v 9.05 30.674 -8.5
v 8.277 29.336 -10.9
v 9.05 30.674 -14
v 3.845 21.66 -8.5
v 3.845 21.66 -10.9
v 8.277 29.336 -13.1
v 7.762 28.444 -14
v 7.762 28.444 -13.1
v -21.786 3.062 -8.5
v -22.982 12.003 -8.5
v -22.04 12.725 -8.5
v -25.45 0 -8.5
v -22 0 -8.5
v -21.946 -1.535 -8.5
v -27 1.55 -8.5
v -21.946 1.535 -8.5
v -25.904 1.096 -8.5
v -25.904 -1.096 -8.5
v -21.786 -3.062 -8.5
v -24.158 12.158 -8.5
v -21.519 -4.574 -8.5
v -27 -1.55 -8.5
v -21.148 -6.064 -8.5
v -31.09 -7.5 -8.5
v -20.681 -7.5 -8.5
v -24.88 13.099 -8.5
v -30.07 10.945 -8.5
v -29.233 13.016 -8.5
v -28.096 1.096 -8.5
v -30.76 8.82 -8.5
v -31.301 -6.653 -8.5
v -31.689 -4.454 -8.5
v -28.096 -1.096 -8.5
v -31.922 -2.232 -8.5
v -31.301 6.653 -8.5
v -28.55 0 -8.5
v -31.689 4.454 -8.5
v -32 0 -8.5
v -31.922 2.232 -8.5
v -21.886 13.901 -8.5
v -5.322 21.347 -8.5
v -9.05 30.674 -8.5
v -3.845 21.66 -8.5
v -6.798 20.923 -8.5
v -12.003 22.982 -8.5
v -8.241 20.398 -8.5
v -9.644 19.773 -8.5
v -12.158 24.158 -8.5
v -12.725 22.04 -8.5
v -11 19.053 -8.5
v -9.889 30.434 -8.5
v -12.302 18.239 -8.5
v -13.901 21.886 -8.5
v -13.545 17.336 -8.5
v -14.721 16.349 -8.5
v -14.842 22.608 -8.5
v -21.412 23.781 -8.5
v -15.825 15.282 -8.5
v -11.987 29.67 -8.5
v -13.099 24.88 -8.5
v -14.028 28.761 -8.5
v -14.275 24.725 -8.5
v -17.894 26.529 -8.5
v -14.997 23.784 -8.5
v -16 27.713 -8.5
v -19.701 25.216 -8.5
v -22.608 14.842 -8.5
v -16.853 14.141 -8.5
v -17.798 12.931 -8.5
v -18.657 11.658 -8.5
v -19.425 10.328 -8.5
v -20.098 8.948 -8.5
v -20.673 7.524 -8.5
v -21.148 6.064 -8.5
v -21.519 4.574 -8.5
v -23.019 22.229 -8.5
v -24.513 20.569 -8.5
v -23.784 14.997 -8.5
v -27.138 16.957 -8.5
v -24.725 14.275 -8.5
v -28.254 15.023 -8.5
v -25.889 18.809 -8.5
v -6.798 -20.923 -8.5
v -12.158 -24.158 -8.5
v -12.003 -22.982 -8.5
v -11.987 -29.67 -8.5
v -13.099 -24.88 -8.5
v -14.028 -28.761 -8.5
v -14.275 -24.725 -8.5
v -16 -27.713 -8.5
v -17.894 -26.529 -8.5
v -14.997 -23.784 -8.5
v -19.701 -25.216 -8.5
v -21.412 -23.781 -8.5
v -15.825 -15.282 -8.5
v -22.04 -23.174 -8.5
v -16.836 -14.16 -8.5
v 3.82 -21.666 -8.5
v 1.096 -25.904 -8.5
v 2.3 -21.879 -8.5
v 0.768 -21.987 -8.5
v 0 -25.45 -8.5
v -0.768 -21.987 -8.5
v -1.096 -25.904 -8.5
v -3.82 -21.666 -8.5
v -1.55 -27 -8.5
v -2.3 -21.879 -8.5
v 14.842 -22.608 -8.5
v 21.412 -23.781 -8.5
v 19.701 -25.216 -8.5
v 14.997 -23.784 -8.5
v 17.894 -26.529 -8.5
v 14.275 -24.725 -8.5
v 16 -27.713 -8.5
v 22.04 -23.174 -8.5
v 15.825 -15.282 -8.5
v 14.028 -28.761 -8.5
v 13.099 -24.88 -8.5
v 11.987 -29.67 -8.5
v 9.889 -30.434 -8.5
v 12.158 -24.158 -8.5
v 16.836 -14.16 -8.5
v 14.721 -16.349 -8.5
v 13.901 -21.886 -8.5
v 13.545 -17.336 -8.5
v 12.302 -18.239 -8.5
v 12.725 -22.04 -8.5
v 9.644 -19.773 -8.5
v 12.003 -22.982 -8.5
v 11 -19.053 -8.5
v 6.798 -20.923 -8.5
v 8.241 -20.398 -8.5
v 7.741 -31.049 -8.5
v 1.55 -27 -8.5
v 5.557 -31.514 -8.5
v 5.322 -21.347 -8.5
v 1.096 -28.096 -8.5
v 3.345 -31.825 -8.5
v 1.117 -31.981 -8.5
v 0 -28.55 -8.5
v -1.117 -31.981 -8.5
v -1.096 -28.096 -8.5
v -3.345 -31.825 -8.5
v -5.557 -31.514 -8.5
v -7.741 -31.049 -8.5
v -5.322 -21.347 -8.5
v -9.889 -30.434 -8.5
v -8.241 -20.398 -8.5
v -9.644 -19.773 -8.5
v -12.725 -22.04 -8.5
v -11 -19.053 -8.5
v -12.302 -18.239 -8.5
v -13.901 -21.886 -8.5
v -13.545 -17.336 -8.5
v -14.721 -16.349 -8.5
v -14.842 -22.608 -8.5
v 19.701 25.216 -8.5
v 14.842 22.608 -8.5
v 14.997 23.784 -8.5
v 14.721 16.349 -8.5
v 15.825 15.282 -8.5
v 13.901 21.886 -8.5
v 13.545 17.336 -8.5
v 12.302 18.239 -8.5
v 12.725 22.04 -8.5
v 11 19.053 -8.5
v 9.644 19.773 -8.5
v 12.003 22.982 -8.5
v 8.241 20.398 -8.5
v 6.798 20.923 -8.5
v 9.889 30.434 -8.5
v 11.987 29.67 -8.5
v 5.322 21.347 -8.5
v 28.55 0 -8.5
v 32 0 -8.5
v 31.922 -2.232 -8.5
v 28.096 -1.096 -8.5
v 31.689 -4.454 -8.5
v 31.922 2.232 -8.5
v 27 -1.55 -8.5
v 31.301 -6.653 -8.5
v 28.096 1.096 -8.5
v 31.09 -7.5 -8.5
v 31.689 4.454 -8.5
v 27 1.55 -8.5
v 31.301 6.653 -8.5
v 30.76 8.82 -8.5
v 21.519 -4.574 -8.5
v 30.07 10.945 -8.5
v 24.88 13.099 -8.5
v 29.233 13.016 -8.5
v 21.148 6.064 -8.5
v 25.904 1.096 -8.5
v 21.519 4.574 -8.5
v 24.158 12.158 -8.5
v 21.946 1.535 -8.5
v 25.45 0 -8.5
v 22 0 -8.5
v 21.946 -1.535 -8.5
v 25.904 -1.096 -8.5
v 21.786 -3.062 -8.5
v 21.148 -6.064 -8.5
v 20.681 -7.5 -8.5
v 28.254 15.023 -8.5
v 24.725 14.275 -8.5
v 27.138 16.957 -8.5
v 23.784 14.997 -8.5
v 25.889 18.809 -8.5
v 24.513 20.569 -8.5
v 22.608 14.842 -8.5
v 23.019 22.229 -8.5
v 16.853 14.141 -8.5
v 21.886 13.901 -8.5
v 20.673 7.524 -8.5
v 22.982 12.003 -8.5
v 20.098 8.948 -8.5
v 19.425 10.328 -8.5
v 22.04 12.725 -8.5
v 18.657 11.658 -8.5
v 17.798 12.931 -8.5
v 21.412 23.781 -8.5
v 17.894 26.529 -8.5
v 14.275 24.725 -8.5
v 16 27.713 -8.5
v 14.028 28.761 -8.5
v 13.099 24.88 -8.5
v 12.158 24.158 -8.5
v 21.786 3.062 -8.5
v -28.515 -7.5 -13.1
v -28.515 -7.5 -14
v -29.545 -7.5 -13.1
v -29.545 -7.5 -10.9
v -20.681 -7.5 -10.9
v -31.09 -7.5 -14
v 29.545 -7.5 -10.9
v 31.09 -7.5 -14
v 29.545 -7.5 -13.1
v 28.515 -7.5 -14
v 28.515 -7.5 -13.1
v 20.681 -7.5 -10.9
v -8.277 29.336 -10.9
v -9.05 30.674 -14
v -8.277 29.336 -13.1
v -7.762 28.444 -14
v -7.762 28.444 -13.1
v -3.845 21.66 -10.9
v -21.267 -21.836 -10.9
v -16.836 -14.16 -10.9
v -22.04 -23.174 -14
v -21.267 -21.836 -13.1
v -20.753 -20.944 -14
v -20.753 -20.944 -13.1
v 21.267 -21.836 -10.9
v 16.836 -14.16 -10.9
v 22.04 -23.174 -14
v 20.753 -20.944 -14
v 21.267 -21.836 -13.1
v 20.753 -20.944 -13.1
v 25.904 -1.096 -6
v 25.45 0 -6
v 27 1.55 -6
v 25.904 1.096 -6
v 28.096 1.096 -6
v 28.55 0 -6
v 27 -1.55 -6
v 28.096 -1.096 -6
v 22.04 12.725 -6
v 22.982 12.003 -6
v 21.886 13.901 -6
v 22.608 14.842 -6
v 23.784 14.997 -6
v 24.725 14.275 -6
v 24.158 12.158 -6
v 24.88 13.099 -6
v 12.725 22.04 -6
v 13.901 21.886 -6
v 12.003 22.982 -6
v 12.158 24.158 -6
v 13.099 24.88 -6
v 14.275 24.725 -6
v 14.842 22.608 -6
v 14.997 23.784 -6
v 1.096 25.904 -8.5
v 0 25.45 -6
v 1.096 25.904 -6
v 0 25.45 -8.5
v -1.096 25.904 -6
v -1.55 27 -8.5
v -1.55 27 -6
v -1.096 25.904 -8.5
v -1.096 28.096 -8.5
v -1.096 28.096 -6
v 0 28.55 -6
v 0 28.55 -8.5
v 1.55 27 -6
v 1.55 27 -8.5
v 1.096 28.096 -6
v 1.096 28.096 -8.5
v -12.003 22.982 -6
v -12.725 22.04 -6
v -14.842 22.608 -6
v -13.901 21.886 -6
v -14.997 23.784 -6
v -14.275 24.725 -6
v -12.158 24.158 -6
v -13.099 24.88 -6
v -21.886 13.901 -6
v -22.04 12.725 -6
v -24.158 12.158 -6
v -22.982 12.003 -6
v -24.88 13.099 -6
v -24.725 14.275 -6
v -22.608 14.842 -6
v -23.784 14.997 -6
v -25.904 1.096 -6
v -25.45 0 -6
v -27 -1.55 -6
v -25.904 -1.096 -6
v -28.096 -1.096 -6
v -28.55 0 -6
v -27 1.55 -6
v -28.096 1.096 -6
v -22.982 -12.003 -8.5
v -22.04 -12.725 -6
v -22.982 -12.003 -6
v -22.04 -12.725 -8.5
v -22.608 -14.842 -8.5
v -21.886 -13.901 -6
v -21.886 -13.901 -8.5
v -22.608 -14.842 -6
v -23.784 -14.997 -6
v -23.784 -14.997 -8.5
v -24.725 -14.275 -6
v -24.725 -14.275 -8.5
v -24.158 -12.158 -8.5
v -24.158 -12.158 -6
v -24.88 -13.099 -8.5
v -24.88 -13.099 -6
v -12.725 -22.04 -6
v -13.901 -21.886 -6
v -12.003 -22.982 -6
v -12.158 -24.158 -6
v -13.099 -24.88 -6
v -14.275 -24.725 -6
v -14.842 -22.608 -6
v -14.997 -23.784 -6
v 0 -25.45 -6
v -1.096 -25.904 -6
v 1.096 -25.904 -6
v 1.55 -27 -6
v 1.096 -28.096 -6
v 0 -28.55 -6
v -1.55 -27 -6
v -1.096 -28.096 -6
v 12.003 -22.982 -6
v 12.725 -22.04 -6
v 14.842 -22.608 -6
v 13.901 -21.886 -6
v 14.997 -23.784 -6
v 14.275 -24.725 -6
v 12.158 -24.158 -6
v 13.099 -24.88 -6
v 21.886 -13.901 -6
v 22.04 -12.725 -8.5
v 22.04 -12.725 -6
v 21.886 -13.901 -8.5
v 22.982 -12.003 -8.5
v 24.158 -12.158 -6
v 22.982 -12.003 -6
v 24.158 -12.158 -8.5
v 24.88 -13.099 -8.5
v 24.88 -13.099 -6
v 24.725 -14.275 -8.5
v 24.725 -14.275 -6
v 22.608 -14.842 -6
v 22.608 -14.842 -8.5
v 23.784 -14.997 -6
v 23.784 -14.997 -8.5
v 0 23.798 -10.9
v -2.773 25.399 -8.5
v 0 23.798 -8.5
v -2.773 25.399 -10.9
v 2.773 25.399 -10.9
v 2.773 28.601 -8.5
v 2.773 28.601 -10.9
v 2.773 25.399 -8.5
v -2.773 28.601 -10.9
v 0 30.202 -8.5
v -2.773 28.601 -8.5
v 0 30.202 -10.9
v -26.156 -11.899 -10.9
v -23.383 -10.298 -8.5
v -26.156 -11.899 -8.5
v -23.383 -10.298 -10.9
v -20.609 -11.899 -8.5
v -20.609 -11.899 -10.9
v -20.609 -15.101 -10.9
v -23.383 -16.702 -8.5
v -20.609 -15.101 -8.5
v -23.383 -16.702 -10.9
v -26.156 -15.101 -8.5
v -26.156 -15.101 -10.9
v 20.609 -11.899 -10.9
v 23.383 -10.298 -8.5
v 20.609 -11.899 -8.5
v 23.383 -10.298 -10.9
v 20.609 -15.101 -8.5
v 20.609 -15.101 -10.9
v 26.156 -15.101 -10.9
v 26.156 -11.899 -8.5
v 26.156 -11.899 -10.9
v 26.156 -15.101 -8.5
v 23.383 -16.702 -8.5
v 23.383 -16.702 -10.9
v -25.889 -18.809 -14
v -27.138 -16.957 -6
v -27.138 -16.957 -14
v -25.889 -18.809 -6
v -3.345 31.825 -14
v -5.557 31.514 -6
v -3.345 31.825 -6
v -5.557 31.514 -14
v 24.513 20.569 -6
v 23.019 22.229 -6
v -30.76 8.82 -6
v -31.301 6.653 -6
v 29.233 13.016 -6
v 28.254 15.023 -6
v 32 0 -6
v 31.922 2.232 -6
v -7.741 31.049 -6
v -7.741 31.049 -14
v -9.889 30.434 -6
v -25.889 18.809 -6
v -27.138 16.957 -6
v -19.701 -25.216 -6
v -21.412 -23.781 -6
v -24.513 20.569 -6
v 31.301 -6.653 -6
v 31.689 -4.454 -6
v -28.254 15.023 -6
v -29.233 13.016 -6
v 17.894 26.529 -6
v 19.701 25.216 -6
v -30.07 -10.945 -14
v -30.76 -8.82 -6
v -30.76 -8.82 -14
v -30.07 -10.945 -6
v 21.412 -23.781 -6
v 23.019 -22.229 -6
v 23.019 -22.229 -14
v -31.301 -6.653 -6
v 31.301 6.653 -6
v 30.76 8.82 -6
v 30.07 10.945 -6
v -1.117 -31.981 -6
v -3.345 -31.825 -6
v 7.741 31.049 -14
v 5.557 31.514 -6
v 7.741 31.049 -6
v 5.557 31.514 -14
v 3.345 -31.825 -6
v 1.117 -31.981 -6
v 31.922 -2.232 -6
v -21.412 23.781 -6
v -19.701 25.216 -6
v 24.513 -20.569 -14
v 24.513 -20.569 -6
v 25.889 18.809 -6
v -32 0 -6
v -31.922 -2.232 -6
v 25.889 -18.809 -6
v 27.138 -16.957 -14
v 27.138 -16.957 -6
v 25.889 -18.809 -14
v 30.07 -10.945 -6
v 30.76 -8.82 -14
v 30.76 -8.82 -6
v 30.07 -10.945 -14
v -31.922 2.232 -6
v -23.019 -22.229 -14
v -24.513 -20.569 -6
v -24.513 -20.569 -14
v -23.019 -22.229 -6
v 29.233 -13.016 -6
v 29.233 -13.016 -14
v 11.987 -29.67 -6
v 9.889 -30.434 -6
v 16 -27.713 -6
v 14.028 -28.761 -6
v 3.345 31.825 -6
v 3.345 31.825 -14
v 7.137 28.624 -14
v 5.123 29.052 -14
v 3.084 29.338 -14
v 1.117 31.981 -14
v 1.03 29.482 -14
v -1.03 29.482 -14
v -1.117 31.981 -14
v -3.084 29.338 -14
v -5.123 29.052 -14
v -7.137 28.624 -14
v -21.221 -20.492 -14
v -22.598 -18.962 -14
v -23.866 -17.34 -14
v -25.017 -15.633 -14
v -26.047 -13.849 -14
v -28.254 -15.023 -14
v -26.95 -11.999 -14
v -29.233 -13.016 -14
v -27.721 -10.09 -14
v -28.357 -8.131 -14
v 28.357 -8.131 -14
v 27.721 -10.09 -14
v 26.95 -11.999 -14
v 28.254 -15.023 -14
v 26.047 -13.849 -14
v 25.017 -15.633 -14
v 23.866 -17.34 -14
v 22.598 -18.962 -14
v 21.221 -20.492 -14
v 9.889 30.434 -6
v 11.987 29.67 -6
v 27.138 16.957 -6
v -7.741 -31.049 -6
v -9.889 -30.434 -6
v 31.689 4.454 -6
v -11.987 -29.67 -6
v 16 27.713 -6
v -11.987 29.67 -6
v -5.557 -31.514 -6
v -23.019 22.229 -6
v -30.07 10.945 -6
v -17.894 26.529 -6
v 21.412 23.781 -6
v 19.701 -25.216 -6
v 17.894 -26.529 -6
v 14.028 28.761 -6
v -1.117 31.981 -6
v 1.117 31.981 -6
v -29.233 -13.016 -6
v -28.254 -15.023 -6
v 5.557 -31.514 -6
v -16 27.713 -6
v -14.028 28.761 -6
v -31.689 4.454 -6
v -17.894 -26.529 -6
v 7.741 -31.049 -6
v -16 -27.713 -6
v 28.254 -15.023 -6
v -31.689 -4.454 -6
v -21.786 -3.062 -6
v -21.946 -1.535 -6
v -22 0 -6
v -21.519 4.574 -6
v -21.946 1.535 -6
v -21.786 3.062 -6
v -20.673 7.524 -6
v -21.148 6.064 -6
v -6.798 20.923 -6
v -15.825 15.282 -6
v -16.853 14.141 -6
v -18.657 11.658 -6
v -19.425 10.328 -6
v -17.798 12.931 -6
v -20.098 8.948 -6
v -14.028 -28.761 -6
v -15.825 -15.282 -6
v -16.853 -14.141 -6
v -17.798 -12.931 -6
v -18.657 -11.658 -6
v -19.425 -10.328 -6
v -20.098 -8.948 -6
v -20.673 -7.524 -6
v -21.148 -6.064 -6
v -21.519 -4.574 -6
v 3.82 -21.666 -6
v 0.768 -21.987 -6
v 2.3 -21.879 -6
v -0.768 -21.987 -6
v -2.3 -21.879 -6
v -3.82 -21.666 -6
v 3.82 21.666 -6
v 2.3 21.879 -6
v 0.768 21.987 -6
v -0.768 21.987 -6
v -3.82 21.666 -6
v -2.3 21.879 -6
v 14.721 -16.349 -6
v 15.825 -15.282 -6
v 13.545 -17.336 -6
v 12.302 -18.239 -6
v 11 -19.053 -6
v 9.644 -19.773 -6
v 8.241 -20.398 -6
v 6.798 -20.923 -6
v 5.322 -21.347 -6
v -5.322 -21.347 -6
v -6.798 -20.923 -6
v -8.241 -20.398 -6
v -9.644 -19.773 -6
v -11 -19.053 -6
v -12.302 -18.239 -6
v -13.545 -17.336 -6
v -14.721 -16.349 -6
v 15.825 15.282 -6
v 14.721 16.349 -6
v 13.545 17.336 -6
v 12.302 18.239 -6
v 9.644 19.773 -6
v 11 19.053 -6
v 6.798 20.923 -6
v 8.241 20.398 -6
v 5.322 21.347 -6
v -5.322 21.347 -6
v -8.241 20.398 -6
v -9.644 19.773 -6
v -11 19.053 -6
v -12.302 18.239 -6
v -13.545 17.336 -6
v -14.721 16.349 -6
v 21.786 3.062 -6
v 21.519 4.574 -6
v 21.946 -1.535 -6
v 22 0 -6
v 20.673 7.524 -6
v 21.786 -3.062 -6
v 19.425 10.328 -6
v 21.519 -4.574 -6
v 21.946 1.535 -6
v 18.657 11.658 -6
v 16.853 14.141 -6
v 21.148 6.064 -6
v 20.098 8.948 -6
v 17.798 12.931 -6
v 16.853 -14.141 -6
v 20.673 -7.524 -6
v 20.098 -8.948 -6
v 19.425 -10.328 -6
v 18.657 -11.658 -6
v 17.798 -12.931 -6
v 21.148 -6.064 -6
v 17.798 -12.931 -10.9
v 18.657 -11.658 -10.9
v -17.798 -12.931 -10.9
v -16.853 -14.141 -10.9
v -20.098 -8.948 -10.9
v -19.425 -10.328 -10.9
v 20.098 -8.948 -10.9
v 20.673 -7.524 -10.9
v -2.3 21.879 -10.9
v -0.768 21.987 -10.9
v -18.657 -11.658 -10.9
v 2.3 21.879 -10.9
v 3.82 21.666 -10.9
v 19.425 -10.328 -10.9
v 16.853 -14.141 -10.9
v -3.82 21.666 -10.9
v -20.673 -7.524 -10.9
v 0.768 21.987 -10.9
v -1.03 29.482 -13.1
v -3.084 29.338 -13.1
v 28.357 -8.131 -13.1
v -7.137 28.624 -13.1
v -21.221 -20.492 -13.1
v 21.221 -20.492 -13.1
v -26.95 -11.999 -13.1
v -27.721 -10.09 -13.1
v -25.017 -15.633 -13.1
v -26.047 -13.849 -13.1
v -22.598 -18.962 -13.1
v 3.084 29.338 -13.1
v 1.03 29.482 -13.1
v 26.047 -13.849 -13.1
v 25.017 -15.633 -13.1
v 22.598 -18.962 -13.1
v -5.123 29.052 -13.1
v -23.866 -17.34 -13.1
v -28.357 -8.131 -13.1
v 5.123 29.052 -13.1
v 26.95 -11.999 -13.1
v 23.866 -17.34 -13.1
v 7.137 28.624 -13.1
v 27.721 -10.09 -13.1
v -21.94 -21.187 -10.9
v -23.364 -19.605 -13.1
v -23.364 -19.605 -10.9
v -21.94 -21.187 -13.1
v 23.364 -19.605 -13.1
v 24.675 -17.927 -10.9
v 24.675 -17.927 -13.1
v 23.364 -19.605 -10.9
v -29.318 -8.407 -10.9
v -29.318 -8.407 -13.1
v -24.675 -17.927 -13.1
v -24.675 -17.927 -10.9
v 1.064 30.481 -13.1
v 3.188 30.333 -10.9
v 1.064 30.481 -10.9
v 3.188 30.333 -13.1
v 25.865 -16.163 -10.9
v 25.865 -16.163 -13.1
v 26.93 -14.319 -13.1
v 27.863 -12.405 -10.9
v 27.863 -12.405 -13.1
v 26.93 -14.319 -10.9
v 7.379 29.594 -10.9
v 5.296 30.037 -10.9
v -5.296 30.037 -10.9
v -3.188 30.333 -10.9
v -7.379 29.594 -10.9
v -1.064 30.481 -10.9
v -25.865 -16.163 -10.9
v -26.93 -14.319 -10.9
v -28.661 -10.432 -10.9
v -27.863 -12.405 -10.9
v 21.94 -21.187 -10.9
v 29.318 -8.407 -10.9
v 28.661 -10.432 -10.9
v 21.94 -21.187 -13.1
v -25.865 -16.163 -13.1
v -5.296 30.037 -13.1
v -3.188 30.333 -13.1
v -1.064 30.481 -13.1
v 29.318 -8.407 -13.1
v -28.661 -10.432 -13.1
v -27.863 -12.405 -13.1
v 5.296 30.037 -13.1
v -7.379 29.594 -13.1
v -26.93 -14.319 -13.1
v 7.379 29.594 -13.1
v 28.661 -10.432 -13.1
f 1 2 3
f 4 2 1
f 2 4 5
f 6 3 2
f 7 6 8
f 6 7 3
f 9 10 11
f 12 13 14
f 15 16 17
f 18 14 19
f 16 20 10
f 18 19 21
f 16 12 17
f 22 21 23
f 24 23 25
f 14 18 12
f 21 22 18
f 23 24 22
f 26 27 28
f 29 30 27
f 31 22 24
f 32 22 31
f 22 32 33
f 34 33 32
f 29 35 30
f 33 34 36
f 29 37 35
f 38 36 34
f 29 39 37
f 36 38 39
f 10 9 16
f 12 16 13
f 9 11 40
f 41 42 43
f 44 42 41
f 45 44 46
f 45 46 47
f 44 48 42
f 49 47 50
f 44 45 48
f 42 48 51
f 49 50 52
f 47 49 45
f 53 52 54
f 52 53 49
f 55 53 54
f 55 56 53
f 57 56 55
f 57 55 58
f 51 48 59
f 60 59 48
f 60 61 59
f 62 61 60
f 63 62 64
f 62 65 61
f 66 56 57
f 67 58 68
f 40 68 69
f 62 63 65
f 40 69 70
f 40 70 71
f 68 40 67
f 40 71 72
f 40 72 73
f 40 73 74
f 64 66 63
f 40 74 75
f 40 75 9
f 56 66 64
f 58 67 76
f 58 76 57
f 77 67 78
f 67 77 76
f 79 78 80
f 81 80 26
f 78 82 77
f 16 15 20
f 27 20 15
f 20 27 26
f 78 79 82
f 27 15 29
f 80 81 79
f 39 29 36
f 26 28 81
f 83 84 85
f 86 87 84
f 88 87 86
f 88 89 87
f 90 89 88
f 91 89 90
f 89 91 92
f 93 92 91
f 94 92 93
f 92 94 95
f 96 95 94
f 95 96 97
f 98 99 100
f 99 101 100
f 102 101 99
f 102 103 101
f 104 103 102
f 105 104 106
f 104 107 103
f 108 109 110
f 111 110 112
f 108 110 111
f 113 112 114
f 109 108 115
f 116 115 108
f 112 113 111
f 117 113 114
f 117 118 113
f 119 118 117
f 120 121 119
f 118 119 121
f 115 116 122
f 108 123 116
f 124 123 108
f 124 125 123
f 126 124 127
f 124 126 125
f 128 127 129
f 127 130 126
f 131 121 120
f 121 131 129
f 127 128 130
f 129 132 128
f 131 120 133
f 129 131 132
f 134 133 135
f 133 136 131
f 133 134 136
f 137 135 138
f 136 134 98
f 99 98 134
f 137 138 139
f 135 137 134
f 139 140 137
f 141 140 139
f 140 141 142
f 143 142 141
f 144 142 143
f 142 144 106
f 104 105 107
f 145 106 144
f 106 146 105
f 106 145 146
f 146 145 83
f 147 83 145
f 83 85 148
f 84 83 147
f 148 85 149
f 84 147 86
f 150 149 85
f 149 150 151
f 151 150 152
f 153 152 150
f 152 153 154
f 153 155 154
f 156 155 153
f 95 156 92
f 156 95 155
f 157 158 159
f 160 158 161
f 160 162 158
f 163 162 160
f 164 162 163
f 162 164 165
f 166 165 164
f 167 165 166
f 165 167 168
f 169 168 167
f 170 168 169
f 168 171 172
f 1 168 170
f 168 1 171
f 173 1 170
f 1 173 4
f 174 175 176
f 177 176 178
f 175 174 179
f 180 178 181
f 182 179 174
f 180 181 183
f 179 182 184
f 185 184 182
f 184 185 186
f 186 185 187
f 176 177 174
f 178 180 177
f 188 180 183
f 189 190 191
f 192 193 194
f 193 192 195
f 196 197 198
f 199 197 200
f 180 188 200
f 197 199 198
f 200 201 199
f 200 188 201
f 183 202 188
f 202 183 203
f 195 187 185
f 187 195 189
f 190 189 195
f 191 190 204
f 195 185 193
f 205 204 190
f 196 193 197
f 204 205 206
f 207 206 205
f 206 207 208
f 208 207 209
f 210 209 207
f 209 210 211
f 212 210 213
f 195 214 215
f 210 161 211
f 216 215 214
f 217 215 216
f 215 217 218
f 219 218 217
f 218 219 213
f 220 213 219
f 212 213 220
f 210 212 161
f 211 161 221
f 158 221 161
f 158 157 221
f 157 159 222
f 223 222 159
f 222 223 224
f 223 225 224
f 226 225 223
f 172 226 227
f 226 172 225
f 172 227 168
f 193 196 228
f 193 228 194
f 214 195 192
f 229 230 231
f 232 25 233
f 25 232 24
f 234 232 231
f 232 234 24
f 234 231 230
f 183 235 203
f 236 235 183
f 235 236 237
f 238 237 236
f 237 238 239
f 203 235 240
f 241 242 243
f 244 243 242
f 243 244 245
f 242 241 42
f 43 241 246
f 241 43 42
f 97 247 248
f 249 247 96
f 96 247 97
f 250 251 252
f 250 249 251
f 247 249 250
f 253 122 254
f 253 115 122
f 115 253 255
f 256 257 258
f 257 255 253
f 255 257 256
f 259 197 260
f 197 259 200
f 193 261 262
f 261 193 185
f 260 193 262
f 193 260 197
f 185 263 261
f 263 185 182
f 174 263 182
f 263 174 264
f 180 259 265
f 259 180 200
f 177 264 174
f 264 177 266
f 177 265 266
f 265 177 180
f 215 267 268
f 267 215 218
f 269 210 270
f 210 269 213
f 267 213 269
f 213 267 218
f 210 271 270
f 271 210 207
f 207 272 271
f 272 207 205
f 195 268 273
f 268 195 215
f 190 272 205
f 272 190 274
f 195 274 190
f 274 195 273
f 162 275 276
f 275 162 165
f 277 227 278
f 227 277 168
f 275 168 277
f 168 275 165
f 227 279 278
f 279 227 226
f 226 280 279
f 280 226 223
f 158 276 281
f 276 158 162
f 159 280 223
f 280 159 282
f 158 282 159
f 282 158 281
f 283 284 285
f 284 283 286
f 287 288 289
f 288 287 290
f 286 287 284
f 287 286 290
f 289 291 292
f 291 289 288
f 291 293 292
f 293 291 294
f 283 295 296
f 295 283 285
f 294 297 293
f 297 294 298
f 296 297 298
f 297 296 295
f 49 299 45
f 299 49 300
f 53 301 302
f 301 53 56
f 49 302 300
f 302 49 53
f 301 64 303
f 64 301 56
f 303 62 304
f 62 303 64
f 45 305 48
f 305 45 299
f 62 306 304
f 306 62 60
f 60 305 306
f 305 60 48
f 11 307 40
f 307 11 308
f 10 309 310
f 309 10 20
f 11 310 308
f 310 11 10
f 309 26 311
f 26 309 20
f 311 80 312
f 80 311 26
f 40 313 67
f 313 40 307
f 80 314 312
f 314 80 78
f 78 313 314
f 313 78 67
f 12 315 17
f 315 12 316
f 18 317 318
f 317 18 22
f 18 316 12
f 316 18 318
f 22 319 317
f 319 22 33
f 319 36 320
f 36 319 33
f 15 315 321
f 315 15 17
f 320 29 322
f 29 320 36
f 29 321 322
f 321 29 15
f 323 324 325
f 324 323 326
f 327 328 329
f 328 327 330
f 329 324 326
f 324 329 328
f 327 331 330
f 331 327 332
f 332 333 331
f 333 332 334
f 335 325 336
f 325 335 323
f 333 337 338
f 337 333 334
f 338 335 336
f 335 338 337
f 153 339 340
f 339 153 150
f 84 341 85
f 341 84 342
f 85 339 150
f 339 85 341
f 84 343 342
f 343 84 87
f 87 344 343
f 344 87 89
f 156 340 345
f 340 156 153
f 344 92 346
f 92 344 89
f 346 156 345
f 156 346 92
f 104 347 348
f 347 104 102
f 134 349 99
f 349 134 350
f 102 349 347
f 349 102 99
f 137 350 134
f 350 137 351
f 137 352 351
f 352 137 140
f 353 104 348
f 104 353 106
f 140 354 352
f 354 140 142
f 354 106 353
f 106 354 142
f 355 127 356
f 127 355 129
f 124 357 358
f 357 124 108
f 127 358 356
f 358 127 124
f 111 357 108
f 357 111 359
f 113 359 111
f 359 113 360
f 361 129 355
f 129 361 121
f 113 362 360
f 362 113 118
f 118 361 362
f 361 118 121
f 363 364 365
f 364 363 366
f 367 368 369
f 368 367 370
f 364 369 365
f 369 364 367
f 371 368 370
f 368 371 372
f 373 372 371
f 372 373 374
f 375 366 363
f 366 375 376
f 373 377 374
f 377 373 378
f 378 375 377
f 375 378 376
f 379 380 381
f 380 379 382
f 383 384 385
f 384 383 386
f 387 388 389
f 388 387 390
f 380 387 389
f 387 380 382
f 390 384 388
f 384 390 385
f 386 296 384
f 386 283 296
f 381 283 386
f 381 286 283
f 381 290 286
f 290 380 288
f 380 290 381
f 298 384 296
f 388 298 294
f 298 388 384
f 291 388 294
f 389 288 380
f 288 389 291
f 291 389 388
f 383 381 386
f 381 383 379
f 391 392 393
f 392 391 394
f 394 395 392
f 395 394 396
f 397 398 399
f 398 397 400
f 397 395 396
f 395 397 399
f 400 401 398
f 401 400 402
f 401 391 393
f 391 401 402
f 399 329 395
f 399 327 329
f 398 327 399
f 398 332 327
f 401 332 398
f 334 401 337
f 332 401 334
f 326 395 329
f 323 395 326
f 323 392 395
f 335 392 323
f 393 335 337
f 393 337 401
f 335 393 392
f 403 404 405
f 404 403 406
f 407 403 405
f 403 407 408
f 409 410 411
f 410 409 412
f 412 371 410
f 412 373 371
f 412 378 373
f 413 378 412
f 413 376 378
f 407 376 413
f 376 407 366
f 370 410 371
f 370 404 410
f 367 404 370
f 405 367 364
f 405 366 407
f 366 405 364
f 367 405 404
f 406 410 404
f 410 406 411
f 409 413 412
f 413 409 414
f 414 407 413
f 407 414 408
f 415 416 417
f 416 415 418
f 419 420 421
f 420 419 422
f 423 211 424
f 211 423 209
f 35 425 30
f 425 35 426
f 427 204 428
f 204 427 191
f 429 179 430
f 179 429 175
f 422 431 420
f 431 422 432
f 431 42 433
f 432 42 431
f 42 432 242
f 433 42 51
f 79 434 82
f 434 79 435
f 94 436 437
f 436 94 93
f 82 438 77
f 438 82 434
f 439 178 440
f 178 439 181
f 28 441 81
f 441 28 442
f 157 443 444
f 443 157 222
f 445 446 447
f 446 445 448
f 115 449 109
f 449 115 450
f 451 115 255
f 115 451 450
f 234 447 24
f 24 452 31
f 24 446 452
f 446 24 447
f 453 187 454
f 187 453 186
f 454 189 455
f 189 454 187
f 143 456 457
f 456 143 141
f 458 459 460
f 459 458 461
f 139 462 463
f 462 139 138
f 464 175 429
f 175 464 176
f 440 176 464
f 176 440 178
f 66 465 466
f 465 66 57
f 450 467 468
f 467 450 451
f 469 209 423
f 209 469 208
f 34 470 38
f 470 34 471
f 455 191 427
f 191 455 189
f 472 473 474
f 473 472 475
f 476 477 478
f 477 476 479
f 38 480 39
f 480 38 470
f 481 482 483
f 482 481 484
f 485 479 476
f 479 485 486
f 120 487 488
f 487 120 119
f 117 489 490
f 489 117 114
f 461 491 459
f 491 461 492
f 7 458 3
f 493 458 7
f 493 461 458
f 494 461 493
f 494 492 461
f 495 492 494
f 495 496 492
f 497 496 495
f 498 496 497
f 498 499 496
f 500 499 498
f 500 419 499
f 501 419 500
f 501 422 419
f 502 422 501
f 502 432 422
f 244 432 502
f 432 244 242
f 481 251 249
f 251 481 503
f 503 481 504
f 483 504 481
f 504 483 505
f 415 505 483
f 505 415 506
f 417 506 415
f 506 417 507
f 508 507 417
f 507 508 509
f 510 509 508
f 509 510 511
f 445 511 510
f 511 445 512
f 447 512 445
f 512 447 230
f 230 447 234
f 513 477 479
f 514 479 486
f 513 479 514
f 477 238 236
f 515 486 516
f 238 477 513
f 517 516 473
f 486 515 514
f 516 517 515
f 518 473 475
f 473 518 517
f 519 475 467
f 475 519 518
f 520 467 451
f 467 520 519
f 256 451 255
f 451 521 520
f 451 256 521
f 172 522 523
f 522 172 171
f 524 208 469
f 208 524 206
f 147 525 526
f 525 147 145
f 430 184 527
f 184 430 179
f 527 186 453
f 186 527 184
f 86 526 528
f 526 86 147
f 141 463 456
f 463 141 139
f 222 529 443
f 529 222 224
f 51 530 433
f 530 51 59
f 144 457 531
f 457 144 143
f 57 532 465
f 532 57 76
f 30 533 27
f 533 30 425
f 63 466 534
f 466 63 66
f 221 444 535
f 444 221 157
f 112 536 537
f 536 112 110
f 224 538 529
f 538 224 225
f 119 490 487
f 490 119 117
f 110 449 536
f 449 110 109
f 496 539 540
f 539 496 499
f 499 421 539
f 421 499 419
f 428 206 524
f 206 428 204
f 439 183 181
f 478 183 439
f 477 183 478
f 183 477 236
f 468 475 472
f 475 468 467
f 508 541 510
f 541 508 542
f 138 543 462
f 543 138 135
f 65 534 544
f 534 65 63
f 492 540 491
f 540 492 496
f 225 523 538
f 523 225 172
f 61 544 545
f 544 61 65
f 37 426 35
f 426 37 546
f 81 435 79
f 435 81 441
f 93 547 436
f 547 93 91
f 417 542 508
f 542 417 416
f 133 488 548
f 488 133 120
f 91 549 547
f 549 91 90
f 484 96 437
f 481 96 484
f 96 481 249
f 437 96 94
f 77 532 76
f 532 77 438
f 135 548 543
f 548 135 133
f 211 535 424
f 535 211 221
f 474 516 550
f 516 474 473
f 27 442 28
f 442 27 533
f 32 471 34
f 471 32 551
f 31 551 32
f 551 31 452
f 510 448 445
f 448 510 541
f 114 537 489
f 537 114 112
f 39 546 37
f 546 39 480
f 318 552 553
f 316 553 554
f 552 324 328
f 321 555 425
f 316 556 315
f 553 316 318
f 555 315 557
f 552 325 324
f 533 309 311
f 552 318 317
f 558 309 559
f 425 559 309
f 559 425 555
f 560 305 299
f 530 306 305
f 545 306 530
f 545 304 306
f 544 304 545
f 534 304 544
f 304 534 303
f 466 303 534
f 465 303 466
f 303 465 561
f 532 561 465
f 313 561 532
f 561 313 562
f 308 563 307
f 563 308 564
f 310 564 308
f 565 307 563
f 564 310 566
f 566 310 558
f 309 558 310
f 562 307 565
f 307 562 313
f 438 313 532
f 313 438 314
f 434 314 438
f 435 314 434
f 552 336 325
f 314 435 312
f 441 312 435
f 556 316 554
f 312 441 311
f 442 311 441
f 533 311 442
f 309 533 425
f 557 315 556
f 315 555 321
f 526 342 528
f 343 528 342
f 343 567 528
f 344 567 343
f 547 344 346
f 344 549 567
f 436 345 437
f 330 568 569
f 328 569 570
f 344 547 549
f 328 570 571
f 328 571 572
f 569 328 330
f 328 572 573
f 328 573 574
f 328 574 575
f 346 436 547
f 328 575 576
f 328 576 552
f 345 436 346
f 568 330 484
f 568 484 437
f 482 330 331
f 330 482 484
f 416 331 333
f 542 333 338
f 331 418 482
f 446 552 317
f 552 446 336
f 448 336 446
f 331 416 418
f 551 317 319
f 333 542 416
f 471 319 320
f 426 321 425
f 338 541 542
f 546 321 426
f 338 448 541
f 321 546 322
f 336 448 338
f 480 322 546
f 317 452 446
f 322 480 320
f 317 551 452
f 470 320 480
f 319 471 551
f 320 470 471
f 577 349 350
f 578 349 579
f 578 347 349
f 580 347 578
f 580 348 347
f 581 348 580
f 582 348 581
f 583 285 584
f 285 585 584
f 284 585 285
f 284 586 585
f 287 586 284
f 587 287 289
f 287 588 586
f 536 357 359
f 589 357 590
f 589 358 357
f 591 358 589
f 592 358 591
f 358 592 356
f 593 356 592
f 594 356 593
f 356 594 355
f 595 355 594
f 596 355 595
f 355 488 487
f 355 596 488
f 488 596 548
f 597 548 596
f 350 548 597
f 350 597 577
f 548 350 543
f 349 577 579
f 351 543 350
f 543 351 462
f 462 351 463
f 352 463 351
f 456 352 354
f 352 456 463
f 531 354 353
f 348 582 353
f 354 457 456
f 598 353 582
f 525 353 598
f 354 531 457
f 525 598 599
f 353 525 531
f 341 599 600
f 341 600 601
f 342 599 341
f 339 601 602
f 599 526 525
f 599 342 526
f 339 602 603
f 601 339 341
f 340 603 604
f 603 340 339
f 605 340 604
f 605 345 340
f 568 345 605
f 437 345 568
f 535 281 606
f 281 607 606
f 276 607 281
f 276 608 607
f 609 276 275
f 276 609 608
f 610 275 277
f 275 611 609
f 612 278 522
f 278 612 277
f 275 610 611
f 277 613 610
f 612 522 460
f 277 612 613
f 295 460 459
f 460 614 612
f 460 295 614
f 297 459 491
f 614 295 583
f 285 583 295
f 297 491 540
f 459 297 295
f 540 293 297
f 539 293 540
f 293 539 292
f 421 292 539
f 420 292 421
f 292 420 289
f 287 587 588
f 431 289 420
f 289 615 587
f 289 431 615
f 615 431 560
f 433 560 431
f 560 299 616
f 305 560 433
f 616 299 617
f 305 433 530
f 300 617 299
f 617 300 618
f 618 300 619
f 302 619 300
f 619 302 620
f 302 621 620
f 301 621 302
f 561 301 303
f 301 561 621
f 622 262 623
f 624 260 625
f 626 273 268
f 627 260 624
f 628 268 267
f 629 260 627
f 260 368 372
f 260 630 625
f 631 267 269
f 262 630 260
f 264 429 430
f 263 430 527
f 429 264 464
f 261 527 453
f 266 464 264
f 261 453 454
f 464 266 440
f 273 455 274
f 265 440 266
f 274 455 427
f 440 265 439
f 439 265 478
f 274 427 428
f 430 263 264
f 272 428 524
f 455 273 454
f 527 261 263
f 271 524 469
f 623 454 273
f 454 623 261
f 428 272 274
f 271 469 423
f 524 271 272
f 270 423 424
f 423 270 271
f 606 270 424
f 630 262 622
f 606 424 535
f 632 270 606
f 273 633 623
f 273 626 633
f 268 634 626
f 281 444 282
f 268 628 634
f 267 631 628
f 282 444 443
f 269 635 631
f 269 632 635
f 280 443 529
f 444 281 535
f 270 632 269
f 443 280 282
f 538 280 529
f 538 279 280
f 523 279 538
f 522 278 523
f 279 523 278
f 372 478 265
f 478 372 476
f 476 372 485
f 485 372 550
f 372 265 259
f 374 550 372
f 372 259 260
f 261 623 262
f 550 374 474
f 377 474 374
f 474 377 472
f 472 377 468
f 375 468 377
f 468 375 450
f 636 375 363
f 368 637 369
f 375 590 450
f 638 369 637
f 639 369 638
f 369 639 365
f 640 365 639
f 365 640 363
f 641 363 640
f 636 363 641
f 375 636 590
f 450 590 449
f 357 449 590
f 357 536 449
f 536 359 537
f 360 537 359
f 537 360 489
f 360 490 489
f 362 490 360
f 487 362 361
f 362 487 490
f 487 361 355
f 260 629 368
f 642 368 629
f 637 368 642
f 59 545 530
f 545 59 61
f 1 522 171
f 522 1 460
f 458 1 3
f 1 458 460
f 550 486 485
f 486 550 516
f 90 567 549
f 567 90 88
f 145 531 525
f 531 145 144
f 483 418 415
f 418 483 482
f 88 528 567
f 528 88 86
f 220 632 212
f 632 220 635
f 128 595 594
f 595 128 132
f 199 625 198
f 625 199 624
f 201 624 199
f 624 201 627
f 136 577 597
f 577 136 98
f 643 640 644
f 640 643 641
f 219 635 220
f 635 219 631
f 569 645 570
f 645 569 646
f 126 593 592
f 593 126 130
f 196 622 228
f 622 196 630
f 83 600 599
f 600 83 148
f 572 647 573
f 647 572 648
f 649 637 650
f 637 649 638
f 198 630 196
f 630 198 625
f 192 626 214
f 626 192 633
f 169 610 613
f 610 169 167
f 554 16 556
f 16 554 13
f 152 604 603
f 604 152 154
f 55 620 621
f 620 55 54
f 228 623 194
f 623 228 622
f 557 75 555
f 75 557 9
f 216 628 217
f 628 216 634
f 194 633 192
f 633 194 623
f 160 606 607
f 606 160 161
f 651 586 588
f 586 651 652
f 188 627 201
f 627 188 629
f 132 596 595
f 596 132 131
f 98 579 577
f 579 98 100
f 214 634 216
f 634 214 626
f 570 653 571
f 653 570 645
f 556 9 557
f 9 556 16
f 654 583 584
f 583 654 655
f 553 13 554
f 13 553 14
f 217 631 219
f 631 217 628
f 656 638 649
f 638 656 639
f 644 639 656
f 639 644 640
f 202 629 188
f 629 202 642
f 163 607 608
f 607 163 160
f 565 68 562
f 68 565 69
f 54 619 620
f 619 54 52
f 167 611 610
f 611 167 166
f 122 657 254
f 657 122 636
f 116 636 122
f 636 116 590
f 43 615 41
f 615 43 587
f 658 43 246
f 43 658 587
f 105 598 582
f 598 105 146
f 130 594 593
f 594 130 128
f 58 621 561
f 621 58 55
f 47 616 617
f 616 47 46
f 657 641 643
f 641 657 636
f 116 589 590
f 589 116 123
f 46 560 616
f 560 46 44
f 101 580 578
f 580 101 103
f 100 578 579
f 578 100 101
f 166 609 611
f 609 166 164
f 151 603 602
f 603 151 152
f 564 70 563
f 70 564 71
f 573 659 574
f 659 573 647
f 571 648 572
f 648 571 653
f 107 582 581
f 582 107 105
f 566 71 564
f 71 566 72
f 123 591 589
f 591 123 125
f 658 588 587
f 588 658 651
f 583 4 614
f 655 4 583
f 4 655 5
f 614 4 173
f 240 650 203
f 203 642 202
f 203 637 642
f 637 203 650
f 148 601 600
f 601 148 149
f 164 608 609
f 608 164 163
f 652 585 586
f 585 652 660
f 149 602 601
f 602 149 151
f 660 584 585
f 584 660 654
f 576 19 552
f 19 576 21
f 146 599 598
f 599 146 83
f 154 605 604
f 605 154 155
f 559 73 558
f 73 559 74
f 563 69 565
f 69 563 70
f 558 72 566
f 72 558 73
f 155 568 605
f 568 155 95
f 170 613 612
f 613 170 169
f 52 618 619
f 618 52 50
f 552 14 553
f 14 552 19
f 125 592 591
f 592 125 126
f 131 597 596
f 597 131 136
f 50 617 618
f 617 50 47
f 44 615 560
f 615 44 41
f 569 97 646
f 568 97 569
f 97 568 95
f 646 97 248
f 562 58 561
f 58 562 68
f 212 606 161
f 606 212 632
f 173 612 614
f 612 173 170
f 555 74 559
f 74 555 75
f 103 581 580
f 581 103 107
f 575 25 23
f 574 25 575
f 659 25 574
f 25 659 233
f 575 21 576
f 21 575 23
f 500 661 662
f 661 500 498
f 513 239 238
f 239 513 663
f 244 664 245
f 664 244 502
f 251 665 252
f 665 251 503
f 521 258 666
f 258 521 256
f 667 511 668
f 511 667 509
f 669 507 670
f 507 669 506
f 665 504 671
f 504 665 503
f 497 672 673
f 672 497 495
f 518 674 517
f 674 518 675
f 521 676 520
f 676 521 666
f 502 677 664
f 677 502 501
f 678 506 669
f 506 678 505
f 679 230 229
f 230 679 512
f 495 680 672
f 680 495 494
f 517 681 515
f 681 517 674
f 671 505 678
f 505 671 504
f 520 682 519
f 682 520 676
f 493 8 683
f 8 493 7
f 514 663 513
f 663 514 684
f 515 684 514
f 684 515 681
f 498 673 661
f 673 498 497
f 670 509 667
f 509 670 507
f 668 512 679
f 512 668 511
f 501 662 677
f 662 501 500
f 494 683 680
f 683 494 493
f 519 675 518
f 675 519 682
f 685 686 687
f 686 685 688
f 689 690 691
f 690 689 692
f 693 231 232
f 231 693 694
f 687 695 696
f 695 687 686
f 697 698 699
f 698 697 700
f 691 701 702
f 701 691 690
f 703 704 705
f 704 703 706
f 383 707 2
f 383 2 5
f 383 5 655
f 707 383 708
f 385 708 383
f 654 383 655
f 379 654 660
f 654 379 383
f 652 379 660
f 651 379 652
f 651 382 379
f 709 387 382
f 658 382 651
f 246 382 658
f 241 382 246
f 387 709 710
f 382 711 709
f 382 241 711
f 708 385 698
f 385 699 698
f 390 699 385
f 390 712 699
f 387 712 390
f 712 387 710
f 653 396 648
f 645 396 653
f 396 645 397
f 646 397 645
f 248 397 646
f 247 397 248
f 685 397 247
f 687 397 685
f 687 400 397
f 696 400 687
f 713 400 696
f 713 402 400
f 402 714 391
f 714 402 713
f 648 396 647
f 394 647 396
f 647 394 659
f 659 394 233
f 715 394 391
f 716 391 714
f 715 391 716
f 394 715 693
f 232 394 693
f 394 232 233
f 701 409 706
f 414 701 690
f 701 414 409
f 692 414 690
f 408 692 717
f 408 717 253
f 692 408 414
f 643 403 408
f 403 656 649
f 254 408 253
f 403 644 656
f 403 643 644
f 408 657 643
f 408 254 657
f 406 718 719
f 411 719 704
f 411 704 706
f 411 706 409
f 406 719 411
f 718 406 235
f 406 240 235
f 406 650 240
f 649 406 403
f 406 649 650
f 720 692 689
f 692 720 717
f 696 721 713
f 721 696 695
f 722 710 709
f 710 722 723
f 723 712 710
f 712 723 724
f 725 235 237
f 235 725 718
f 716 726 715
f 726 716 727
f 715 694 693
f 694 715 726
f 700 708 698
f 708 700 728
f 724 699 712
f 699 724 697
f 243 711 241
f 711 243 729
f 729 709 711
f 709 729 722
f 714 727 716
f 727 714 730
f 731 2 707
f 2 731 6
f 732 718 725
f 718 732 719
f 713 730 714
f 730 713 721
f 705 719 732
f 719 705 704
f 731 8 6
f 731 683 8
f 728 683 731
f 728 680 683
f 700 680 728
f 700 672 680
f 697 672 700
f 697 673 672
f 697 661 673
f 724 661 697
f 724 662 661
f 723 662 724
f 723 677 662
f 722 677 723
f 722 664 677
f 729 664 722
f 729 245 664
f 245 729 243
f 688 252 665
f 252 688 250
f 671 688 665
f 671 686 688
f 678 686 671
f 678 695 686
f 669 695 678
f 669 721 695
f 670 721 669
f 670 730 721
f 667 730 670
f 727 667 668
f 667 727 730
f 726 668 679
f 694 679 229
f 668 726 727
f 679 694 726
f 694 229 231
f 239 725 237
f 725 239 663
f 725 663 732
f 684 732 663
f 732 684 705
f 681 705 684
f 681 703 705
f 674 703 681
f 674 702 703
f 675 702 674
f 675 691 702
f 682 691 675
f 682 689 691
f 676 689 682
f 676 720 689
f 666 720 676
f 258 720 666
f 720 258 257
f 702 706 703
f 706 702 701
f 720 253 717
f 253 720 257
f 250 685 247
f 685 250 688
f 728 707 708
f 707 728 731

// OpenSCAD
// file: beam.scad
// Misumi Beam
module misumibeam(size1=15, size2=15, length=100, extra=0.1) {
   difference() {
      cube([size1+extra, size2+extra, length], center=true);
      for (a = [0:180:180]) rotate([0, 0, a]) {
         translate([size1/2, 0, 0]) {
          //  % cube([size1/2, 3, length+1], center=true);
			minkowski() {
               cube([size1/2-(extra+1), size1/6-extra, length+1], center=true);
               cylinder(r=0.5, h=1, center=true);
			} 
        }
      }
      for (a = [0:90:270]) rotate([0, 0, a]) {
         translate([size2/2, 0, 0]) {
          //  % cube([size1/2, 3, length+1], center=true);
			minkowski() {
               cube([size1/2-(extra+1), size1/6-extra, length+1], center=true);
               cylinder(r=0.5, h=1, center=true);
			} 
        }
      }
   }
}

# misumibeam(15, 15, 300);
// file: nema17.scad
include <configuration.scad>;

// NEMA17 stepper motor

module stepper_motor(length=47.5, shaft_radius=5.00/2) {
   intersection() {
      cube([42.2, length, 42.2], center=true);
      rotate([90, 0, 0])
      cylinder(r=25.5, h=length+1, center=true);
   }
   translate([0, -length/2, 0]) {
// drive shaft
		rotate([90, 0, 0]) {
		 cylinder(r1=11, r2=11, h=2, $fn=40);
		 cylinder(r=shaft_radius, h=25);
		}
// mounting bolts
      for (a = [0:90:360]) rotate([0, a, 0]) {
         translate([15.5, 0, 15.5]) rotate([90, 0, 0])
         cylinder(r=m3_major_radius, h=10,  $fn=30);
      }
   }
}

module stepper_motor_boolean(length=47.5, shaft_radius=7.00/2) {
   intersection() {
      cube([42.2, length, 42.2], center=true);
      rotate([90, 0, 0])
      cylinder(r=25.5, h=length+1, center=true);
   }
   translate([0, -length/2, 0]) {
// drive shaft
		rotate([90, 0, 0]) {
		 cylinder(r1=12+extra_boolean, r2=11+extra_boolean, h=2, $fn=40);
		 cylinder(r=shaft_radius, h=25, $fn=8);
		}
// mounting bolts
      for (a = [0:90:360]) rotate([0, a, 0]) {
         translate([15.5, 0, 15.5]) rotate([90, 0, 0])
         cylinder(r=m3_major_radius+extra_radius, h=10,  $fn=8);
      }
   }
}

//# stepper_motor();
# stepper_motor_boolean();
// file: metric_fastners.scad
/*
 *  OpenSCAD Metric Fastners Library (www.openscad.org)
 *  Copyright (C) 2010-2011  Giles Bathgate
 *
 *  This program is free software; you can redistribute it and/or modify
 *  it under the terms of the GNU General Public License as published by
 *  the Free Software Foundation; either version 3 of the License,
 *  LGPL version 2.1, or (at your option) any later version of the GPL.
 *
 *  This program is distributed in the hope that it will be useful,
 *  but WITHOUT ANY WARRANTY; without even the implied warranty of
 *  MERCHANTABILITY or FITNESS FOR A PARTICULAR PURPOSE.  See the
 *  GNU General Public License for more details.
 *
 *  You should have received a copy of the GNU General Public License
 *  along with this program; if not, write to the Free Software
 *  Foundation, Inc., 59 Temple Place, Suite 330, Boston, MA 02111-1307 USA
 *
*/

$fn=50;
apply_chamfer=false;

// M3 Mesurements
m3_minor_radius = 2.50/2;
m3_major_radius = 3.00/2;
m3_head_radius = 5.50/2;
m3_nut_radius = 6.20/2;

// M4 Mesurements
m4_minor_radius = 3.30/2;
m4_major_radius = 4.00/2;
m4_head_radius = 7.00/2;
m4_nut_radius = 8.26/2;

// M5 Mesurements
m5_minor_radius = 4.20/2;
m5_major_radius = 5.00/2;
m5_head_radius = 8.50/2;
m5_nut_radius = 10.33/2;

// M6 Mesurements
m6_minor_radius = 5.00/2;
m6_major_radius = 6.00/2;
m6_head_radius = 10.00/2;
m6_nut_radius = 12.40/2;


module cap_bolt(dia,len)
{
	e=1.5*dia;
	h1=1.25*dia;
	cylinder(r=dia/2,h=len);
	translate([0,0,-h1]) cylinder(r=e/2,h=h1);
}

module cap_bolt_boolean(dia,len,fn=8)
{
	e=1.87*dia;
	h1=2*dia;
	cylinder(r=dia/2,h=len,$fn=fn);
	translate([0,0,-h1+0.05]) cylinder(r2=e/2+0.15,r1=e/2+0.3,h=h1,$fn=fn);
}

module csk_bolt(dia,len)
{
	h1=0.6*dia;
	h2=len-h1;
	cylinder(r=dia/2,h=h2);
	cylinder(r1=dia,r2=dia/2,h=h1);
}

module washer(dia)
{
	t=0.1*dia;
	difference()
	{
		cylinder(r=dia,h=t);
		translate([0,0,-t/2])cylinder(r=dia/2,h=t*2);
	}
}

module flat_nut(dia)
{
	m=0.8*dia;
	e=2.066*dia;
	c=0.2*dia;
	difference()
	{
		cylinder(r=e/2,h=m,$fn=6);
		translate([0,0,-m/2])cylinder(r=dia/2,h=m*2);
		if(apply_chamfer)
		    translate([0,0,c])cylinder_chamfer(e/2,c);
	}
}

module flat_nut_boolean(dia)
{
	m=0.8*dia;
	e=2.066*dia;
	c=0.2*dia;
	difference()
	{
		cylinder(r=e/2,h=m,$fn=6);
		if(apply_chamfer)
		    translate([0,0,c])cylinder_chamfer(e/2,c);
	}
}

module bolt(dia,len)
{
	e=1.8*dia;
	k=0.7*dia;
	c=0.2*dia;
	difference()
	{
		cylinder(r=e/2,h=k,$fn=6);
		if(apply_chamfer)
		    translate([0,0,c])cylinder_chamfer(e/2,c);
	}

	cylinder(r=dia/2,h=len);

}

module cylinder_chamfer(r1,r2)
{
	t=r1-r2;
	p=r2*2;
	rotate_extrude()
	difference()
	{
		translate([t,-p])square([p,p]);
		translate([t,0])circle(r2);
	}
}

module chamfer(len,r)
{
	p=r*2;
	linear_extrude(height=len)
	difference()
	{
		square([p,p]);
		circle(r);
	}
}

union()
{
//cap_bolt(3,15);
//cap_bolt_boolean(3,15,30);
//csk_bolt(3,14);
//washer(3);
//flat_nut_boolean(3);
//bolt(4,14);
//cylinder_chamfer(8,1);
//chamfer(10,2);
}
// file: effector.scad
// Delta-Six 3D Printer 
// Created by Sage Merrill
// Released on Openbuilds.com
// Based on orginal design by Johann C. Rocholl (Kossel Printer)
// License = Attribution Share Alike - CC BY SA

include <configuration.scad>;
//use <light_ring_mount.scad>;

effector_offset = 37;  // Same as DELTA_EFFECTOR_OFFSET in Marlin.
effector_height = 11;
effector_arm_width = 15;
effector_arm_depth = 3;
effector_arm_bore = m3_bolt;

arm_separation = global_delta_arm_seperation-effector_arm_width;  // delta arm seperation
effector_bore_radius = global_effector_bore_radius;
mounting_hole_radius = global_mounting_hole_radius;


module effector() {
difference() {
// Main Body
	intersection() {	
		union() {
			minkowski() {
				cylinder(r=effector_offset-effector_arm_depth, h=1, center=true, $fn=6);
				sphere(effector_height/2, $fn=8);
			}
// Arms
			for (a = [60:120:360]) rotate([0, 0, a]) {
				for (s = [-1, 1]) scale([s, 1, 1]) {
					translate([arm_separation/2, effector_offset, 0]) rotate([90, 22.5, 90])
					 cylinder(r=effector_height/2+0.5, h=effector_arm_width, center=true, $fn=8);
					translate([arm_separation/2, effector_offset/2, 0])
					 cube([effector_arm_width, effector_offset, effector_height], center=true);
				}
			}
		}

// Plane down the height
	cube([300, 300, effector_height], center=true);	
	}

// Horizontal Arm Bore
#	for (a = [60:120:360]) rotate([0, 0, a]) {
		translate([0, effector_offset, 0]) rotate([0, 90, 0])
		 cylinder(r=effector_arm_bore/2, h=arm_separation+2*effector_arm_width, center=true, $fn=15);
	}

// Angled Arm Bores
*		for (a = [60:120:360]) rotate([0, 0, a]) {
			for (s = [-1, 1]) scale([s, 1, 1]) {
			translate([arm_separation/2, 22, -15]) rotate([-45, 0, 0])
			 cap_bolt(effector_arm_bore, 30);
			}		
		}

// Angled Nut channels
*		for (a = [60:120:360]) rotate([0, 0, a]) {
			for (a = [-1, 1]) scale([a, 1, 1]) {
			 translate([arm_separation/2, 36, -1]) rotate([-45, 0, 0])
				hull() {	
					for (h = [-1,1]) {
						translate([0, 10*h-9.5, 0]) rotate([0, 0, 30])
						 flat_nut_boolean(effector_arm_bore);
					}
				}
			}
		}

// Central Hole
	 cylinder(r=effector_bore_radius, h=effector_height*2, center=true, $fn=90);

// Hot End Mounting Holes
	for (a = [0:30:360]) rotate([0, 0, a]) {
		translate([0, mounting_hole_radius, 10]) rotate([0, 180, 0])
		 cap_bolt_boolean(m3_bolt_boolean, 20);
	 }

}

// Add the Light Ring Mount
	translate([0, 0, -effector_height/2-0.5]) rotate([0, 0, 0])	
	 light_mount();

}

// Primary placement
translate([0, 0, 0]) rotate([0, 0, 0])
 effector();


// reference/measure
*#	translate([0, 0, 0]) rotate([0, 0, 0])
	 cylinder(r=effector_offset, h=effector_height*2, center=true, $fn=30);

*#	translate([0, 0, 0]) rotate([0, 0, 0])
	 cube([arm_separation+effector_arm_width, effector_offset*2, effector_height*2], center=true);
// file: configuration.scad
// Delta-Six 3D Printer 
// Created by Sage Merrill
// Released on Openbuilds.com
// Based on orginal design by Johann C. Rocholl (Kossel Printer)
// License = Attribution Share Alike - CC BY SA


include <metric_fastners.scad>;
use <nema17.scad>;
use <beam.scad>;
use <timing_belts.scad>;

$fn=20;

// Increase this if your slicer or printer makes the holes too small.
extra_radius = 0.10;
extra_boolean = 0.15;

// Delta Parameters
global_delta_arm_seperation = 55;
global_effector_bore_radius = 21;
global_mounting_hole_radius = 27;

// M5 Hardware
m5_bolt = m5_major_radius*2;
m5_bolt_boolean = m5_bolt+extra_radius;

// M3 Hardware
m3_bolt = m3_major_radius*2;
m3_bolt_boolean = m3_bolt+extra_radius;

// NEMA17 stepper motor
motor_length = 47.5;
motor_shaft_radius= 5.00/2;
// main file
// Delta-Six 3D Printer 
// Created by Sage Merrill
// Released on Openbuilds.com
// Based on orginal design by Johann C. Rocholl (Kossel Printer)
// License = Attribution Share Alike - CC BY SA

include <configuration.scad>;
use <effector.scad>;

effector_height = 11;
effector_bore = global_effector_bore_radius+1;
mounting_hole_radius = global_mounting_hole_radius;

/*************************************************************************/

// Light Ring
module light_ring(){
difference () {
	translate([0, 0, 0]) rotate([0, 0, 0]) 
	 cylinder(r=60/2, h=1.8, center=true, $fn=90);
	translate([0, 0, 0]) rotate([0, 0, 0]) 
	 cylinder(r=44/2, h=10, center=true, $fn=90);		
	}
}


// Light Ring Mount
module light_mount(){
	difference () {
		union() {
			translate([0, 0, 0]) rotate([0, 0, 0]) 
			 cylinder(r=64/2, h=8, center=true, $fn=90);
		}

// Center Bore
	translate([0, 0, 0]) rotate([0, 0, 0]) 
	 cylinder(r=effector_bore, h=10, center=true, $fn=90);		
	translate([0, 0, -6]) rotate([0, 0, 0]) 
	 cylinder(r=59/2, h=10, center=true, $fn=90);

// Light Ring
	translate([0, 0, -2]) rotate([0, 0, 0]) 
	 cylinder(r=61/2, h=2.2, center=true, $fn=90);

// Wedge Cuts
		for (a = [30:120:360]) rotate([0, 0, a]) {
			translate([30, 0, -8.5]) rotate([0, 0, 60]) 
			 cylinder(r=90/2, h=10, center=false, $fn=3);		
		}

// Bolt holes
		for (a = [0:30:360]) rotate([0, 0, a]) {
			translate([mounting_hole_radius, 0, 25]) rotate([0, 180, 0]) 
			 cap_bolt_boolean(m3_bolt_boolean, 50);
		}

// Nut holes
		for (a = [0:30:360]) rotate([0, 0, a]) {
			translate([mounting_hole_radius, 0, 1.5]) rotate([0, 180, 0]) 
			 flat_nut_boolean(m3_bolt_boolean);
		}
	}
}



// Primary Placement
	translate([0, 0, -effector_height/2-4.5]) rotate([0, 0, 0])	
	 light_mount();


//  Reference objects
*%union () {
// Effector
	translate([0, 0, 0]) rotate([0, 0, 0]) 
	 effector();

// Light Ring
	translate([0, 0, -effector_height/2-6.5]) rotate([0, 0, 0])  color ("white")
	 light_ring();
}
